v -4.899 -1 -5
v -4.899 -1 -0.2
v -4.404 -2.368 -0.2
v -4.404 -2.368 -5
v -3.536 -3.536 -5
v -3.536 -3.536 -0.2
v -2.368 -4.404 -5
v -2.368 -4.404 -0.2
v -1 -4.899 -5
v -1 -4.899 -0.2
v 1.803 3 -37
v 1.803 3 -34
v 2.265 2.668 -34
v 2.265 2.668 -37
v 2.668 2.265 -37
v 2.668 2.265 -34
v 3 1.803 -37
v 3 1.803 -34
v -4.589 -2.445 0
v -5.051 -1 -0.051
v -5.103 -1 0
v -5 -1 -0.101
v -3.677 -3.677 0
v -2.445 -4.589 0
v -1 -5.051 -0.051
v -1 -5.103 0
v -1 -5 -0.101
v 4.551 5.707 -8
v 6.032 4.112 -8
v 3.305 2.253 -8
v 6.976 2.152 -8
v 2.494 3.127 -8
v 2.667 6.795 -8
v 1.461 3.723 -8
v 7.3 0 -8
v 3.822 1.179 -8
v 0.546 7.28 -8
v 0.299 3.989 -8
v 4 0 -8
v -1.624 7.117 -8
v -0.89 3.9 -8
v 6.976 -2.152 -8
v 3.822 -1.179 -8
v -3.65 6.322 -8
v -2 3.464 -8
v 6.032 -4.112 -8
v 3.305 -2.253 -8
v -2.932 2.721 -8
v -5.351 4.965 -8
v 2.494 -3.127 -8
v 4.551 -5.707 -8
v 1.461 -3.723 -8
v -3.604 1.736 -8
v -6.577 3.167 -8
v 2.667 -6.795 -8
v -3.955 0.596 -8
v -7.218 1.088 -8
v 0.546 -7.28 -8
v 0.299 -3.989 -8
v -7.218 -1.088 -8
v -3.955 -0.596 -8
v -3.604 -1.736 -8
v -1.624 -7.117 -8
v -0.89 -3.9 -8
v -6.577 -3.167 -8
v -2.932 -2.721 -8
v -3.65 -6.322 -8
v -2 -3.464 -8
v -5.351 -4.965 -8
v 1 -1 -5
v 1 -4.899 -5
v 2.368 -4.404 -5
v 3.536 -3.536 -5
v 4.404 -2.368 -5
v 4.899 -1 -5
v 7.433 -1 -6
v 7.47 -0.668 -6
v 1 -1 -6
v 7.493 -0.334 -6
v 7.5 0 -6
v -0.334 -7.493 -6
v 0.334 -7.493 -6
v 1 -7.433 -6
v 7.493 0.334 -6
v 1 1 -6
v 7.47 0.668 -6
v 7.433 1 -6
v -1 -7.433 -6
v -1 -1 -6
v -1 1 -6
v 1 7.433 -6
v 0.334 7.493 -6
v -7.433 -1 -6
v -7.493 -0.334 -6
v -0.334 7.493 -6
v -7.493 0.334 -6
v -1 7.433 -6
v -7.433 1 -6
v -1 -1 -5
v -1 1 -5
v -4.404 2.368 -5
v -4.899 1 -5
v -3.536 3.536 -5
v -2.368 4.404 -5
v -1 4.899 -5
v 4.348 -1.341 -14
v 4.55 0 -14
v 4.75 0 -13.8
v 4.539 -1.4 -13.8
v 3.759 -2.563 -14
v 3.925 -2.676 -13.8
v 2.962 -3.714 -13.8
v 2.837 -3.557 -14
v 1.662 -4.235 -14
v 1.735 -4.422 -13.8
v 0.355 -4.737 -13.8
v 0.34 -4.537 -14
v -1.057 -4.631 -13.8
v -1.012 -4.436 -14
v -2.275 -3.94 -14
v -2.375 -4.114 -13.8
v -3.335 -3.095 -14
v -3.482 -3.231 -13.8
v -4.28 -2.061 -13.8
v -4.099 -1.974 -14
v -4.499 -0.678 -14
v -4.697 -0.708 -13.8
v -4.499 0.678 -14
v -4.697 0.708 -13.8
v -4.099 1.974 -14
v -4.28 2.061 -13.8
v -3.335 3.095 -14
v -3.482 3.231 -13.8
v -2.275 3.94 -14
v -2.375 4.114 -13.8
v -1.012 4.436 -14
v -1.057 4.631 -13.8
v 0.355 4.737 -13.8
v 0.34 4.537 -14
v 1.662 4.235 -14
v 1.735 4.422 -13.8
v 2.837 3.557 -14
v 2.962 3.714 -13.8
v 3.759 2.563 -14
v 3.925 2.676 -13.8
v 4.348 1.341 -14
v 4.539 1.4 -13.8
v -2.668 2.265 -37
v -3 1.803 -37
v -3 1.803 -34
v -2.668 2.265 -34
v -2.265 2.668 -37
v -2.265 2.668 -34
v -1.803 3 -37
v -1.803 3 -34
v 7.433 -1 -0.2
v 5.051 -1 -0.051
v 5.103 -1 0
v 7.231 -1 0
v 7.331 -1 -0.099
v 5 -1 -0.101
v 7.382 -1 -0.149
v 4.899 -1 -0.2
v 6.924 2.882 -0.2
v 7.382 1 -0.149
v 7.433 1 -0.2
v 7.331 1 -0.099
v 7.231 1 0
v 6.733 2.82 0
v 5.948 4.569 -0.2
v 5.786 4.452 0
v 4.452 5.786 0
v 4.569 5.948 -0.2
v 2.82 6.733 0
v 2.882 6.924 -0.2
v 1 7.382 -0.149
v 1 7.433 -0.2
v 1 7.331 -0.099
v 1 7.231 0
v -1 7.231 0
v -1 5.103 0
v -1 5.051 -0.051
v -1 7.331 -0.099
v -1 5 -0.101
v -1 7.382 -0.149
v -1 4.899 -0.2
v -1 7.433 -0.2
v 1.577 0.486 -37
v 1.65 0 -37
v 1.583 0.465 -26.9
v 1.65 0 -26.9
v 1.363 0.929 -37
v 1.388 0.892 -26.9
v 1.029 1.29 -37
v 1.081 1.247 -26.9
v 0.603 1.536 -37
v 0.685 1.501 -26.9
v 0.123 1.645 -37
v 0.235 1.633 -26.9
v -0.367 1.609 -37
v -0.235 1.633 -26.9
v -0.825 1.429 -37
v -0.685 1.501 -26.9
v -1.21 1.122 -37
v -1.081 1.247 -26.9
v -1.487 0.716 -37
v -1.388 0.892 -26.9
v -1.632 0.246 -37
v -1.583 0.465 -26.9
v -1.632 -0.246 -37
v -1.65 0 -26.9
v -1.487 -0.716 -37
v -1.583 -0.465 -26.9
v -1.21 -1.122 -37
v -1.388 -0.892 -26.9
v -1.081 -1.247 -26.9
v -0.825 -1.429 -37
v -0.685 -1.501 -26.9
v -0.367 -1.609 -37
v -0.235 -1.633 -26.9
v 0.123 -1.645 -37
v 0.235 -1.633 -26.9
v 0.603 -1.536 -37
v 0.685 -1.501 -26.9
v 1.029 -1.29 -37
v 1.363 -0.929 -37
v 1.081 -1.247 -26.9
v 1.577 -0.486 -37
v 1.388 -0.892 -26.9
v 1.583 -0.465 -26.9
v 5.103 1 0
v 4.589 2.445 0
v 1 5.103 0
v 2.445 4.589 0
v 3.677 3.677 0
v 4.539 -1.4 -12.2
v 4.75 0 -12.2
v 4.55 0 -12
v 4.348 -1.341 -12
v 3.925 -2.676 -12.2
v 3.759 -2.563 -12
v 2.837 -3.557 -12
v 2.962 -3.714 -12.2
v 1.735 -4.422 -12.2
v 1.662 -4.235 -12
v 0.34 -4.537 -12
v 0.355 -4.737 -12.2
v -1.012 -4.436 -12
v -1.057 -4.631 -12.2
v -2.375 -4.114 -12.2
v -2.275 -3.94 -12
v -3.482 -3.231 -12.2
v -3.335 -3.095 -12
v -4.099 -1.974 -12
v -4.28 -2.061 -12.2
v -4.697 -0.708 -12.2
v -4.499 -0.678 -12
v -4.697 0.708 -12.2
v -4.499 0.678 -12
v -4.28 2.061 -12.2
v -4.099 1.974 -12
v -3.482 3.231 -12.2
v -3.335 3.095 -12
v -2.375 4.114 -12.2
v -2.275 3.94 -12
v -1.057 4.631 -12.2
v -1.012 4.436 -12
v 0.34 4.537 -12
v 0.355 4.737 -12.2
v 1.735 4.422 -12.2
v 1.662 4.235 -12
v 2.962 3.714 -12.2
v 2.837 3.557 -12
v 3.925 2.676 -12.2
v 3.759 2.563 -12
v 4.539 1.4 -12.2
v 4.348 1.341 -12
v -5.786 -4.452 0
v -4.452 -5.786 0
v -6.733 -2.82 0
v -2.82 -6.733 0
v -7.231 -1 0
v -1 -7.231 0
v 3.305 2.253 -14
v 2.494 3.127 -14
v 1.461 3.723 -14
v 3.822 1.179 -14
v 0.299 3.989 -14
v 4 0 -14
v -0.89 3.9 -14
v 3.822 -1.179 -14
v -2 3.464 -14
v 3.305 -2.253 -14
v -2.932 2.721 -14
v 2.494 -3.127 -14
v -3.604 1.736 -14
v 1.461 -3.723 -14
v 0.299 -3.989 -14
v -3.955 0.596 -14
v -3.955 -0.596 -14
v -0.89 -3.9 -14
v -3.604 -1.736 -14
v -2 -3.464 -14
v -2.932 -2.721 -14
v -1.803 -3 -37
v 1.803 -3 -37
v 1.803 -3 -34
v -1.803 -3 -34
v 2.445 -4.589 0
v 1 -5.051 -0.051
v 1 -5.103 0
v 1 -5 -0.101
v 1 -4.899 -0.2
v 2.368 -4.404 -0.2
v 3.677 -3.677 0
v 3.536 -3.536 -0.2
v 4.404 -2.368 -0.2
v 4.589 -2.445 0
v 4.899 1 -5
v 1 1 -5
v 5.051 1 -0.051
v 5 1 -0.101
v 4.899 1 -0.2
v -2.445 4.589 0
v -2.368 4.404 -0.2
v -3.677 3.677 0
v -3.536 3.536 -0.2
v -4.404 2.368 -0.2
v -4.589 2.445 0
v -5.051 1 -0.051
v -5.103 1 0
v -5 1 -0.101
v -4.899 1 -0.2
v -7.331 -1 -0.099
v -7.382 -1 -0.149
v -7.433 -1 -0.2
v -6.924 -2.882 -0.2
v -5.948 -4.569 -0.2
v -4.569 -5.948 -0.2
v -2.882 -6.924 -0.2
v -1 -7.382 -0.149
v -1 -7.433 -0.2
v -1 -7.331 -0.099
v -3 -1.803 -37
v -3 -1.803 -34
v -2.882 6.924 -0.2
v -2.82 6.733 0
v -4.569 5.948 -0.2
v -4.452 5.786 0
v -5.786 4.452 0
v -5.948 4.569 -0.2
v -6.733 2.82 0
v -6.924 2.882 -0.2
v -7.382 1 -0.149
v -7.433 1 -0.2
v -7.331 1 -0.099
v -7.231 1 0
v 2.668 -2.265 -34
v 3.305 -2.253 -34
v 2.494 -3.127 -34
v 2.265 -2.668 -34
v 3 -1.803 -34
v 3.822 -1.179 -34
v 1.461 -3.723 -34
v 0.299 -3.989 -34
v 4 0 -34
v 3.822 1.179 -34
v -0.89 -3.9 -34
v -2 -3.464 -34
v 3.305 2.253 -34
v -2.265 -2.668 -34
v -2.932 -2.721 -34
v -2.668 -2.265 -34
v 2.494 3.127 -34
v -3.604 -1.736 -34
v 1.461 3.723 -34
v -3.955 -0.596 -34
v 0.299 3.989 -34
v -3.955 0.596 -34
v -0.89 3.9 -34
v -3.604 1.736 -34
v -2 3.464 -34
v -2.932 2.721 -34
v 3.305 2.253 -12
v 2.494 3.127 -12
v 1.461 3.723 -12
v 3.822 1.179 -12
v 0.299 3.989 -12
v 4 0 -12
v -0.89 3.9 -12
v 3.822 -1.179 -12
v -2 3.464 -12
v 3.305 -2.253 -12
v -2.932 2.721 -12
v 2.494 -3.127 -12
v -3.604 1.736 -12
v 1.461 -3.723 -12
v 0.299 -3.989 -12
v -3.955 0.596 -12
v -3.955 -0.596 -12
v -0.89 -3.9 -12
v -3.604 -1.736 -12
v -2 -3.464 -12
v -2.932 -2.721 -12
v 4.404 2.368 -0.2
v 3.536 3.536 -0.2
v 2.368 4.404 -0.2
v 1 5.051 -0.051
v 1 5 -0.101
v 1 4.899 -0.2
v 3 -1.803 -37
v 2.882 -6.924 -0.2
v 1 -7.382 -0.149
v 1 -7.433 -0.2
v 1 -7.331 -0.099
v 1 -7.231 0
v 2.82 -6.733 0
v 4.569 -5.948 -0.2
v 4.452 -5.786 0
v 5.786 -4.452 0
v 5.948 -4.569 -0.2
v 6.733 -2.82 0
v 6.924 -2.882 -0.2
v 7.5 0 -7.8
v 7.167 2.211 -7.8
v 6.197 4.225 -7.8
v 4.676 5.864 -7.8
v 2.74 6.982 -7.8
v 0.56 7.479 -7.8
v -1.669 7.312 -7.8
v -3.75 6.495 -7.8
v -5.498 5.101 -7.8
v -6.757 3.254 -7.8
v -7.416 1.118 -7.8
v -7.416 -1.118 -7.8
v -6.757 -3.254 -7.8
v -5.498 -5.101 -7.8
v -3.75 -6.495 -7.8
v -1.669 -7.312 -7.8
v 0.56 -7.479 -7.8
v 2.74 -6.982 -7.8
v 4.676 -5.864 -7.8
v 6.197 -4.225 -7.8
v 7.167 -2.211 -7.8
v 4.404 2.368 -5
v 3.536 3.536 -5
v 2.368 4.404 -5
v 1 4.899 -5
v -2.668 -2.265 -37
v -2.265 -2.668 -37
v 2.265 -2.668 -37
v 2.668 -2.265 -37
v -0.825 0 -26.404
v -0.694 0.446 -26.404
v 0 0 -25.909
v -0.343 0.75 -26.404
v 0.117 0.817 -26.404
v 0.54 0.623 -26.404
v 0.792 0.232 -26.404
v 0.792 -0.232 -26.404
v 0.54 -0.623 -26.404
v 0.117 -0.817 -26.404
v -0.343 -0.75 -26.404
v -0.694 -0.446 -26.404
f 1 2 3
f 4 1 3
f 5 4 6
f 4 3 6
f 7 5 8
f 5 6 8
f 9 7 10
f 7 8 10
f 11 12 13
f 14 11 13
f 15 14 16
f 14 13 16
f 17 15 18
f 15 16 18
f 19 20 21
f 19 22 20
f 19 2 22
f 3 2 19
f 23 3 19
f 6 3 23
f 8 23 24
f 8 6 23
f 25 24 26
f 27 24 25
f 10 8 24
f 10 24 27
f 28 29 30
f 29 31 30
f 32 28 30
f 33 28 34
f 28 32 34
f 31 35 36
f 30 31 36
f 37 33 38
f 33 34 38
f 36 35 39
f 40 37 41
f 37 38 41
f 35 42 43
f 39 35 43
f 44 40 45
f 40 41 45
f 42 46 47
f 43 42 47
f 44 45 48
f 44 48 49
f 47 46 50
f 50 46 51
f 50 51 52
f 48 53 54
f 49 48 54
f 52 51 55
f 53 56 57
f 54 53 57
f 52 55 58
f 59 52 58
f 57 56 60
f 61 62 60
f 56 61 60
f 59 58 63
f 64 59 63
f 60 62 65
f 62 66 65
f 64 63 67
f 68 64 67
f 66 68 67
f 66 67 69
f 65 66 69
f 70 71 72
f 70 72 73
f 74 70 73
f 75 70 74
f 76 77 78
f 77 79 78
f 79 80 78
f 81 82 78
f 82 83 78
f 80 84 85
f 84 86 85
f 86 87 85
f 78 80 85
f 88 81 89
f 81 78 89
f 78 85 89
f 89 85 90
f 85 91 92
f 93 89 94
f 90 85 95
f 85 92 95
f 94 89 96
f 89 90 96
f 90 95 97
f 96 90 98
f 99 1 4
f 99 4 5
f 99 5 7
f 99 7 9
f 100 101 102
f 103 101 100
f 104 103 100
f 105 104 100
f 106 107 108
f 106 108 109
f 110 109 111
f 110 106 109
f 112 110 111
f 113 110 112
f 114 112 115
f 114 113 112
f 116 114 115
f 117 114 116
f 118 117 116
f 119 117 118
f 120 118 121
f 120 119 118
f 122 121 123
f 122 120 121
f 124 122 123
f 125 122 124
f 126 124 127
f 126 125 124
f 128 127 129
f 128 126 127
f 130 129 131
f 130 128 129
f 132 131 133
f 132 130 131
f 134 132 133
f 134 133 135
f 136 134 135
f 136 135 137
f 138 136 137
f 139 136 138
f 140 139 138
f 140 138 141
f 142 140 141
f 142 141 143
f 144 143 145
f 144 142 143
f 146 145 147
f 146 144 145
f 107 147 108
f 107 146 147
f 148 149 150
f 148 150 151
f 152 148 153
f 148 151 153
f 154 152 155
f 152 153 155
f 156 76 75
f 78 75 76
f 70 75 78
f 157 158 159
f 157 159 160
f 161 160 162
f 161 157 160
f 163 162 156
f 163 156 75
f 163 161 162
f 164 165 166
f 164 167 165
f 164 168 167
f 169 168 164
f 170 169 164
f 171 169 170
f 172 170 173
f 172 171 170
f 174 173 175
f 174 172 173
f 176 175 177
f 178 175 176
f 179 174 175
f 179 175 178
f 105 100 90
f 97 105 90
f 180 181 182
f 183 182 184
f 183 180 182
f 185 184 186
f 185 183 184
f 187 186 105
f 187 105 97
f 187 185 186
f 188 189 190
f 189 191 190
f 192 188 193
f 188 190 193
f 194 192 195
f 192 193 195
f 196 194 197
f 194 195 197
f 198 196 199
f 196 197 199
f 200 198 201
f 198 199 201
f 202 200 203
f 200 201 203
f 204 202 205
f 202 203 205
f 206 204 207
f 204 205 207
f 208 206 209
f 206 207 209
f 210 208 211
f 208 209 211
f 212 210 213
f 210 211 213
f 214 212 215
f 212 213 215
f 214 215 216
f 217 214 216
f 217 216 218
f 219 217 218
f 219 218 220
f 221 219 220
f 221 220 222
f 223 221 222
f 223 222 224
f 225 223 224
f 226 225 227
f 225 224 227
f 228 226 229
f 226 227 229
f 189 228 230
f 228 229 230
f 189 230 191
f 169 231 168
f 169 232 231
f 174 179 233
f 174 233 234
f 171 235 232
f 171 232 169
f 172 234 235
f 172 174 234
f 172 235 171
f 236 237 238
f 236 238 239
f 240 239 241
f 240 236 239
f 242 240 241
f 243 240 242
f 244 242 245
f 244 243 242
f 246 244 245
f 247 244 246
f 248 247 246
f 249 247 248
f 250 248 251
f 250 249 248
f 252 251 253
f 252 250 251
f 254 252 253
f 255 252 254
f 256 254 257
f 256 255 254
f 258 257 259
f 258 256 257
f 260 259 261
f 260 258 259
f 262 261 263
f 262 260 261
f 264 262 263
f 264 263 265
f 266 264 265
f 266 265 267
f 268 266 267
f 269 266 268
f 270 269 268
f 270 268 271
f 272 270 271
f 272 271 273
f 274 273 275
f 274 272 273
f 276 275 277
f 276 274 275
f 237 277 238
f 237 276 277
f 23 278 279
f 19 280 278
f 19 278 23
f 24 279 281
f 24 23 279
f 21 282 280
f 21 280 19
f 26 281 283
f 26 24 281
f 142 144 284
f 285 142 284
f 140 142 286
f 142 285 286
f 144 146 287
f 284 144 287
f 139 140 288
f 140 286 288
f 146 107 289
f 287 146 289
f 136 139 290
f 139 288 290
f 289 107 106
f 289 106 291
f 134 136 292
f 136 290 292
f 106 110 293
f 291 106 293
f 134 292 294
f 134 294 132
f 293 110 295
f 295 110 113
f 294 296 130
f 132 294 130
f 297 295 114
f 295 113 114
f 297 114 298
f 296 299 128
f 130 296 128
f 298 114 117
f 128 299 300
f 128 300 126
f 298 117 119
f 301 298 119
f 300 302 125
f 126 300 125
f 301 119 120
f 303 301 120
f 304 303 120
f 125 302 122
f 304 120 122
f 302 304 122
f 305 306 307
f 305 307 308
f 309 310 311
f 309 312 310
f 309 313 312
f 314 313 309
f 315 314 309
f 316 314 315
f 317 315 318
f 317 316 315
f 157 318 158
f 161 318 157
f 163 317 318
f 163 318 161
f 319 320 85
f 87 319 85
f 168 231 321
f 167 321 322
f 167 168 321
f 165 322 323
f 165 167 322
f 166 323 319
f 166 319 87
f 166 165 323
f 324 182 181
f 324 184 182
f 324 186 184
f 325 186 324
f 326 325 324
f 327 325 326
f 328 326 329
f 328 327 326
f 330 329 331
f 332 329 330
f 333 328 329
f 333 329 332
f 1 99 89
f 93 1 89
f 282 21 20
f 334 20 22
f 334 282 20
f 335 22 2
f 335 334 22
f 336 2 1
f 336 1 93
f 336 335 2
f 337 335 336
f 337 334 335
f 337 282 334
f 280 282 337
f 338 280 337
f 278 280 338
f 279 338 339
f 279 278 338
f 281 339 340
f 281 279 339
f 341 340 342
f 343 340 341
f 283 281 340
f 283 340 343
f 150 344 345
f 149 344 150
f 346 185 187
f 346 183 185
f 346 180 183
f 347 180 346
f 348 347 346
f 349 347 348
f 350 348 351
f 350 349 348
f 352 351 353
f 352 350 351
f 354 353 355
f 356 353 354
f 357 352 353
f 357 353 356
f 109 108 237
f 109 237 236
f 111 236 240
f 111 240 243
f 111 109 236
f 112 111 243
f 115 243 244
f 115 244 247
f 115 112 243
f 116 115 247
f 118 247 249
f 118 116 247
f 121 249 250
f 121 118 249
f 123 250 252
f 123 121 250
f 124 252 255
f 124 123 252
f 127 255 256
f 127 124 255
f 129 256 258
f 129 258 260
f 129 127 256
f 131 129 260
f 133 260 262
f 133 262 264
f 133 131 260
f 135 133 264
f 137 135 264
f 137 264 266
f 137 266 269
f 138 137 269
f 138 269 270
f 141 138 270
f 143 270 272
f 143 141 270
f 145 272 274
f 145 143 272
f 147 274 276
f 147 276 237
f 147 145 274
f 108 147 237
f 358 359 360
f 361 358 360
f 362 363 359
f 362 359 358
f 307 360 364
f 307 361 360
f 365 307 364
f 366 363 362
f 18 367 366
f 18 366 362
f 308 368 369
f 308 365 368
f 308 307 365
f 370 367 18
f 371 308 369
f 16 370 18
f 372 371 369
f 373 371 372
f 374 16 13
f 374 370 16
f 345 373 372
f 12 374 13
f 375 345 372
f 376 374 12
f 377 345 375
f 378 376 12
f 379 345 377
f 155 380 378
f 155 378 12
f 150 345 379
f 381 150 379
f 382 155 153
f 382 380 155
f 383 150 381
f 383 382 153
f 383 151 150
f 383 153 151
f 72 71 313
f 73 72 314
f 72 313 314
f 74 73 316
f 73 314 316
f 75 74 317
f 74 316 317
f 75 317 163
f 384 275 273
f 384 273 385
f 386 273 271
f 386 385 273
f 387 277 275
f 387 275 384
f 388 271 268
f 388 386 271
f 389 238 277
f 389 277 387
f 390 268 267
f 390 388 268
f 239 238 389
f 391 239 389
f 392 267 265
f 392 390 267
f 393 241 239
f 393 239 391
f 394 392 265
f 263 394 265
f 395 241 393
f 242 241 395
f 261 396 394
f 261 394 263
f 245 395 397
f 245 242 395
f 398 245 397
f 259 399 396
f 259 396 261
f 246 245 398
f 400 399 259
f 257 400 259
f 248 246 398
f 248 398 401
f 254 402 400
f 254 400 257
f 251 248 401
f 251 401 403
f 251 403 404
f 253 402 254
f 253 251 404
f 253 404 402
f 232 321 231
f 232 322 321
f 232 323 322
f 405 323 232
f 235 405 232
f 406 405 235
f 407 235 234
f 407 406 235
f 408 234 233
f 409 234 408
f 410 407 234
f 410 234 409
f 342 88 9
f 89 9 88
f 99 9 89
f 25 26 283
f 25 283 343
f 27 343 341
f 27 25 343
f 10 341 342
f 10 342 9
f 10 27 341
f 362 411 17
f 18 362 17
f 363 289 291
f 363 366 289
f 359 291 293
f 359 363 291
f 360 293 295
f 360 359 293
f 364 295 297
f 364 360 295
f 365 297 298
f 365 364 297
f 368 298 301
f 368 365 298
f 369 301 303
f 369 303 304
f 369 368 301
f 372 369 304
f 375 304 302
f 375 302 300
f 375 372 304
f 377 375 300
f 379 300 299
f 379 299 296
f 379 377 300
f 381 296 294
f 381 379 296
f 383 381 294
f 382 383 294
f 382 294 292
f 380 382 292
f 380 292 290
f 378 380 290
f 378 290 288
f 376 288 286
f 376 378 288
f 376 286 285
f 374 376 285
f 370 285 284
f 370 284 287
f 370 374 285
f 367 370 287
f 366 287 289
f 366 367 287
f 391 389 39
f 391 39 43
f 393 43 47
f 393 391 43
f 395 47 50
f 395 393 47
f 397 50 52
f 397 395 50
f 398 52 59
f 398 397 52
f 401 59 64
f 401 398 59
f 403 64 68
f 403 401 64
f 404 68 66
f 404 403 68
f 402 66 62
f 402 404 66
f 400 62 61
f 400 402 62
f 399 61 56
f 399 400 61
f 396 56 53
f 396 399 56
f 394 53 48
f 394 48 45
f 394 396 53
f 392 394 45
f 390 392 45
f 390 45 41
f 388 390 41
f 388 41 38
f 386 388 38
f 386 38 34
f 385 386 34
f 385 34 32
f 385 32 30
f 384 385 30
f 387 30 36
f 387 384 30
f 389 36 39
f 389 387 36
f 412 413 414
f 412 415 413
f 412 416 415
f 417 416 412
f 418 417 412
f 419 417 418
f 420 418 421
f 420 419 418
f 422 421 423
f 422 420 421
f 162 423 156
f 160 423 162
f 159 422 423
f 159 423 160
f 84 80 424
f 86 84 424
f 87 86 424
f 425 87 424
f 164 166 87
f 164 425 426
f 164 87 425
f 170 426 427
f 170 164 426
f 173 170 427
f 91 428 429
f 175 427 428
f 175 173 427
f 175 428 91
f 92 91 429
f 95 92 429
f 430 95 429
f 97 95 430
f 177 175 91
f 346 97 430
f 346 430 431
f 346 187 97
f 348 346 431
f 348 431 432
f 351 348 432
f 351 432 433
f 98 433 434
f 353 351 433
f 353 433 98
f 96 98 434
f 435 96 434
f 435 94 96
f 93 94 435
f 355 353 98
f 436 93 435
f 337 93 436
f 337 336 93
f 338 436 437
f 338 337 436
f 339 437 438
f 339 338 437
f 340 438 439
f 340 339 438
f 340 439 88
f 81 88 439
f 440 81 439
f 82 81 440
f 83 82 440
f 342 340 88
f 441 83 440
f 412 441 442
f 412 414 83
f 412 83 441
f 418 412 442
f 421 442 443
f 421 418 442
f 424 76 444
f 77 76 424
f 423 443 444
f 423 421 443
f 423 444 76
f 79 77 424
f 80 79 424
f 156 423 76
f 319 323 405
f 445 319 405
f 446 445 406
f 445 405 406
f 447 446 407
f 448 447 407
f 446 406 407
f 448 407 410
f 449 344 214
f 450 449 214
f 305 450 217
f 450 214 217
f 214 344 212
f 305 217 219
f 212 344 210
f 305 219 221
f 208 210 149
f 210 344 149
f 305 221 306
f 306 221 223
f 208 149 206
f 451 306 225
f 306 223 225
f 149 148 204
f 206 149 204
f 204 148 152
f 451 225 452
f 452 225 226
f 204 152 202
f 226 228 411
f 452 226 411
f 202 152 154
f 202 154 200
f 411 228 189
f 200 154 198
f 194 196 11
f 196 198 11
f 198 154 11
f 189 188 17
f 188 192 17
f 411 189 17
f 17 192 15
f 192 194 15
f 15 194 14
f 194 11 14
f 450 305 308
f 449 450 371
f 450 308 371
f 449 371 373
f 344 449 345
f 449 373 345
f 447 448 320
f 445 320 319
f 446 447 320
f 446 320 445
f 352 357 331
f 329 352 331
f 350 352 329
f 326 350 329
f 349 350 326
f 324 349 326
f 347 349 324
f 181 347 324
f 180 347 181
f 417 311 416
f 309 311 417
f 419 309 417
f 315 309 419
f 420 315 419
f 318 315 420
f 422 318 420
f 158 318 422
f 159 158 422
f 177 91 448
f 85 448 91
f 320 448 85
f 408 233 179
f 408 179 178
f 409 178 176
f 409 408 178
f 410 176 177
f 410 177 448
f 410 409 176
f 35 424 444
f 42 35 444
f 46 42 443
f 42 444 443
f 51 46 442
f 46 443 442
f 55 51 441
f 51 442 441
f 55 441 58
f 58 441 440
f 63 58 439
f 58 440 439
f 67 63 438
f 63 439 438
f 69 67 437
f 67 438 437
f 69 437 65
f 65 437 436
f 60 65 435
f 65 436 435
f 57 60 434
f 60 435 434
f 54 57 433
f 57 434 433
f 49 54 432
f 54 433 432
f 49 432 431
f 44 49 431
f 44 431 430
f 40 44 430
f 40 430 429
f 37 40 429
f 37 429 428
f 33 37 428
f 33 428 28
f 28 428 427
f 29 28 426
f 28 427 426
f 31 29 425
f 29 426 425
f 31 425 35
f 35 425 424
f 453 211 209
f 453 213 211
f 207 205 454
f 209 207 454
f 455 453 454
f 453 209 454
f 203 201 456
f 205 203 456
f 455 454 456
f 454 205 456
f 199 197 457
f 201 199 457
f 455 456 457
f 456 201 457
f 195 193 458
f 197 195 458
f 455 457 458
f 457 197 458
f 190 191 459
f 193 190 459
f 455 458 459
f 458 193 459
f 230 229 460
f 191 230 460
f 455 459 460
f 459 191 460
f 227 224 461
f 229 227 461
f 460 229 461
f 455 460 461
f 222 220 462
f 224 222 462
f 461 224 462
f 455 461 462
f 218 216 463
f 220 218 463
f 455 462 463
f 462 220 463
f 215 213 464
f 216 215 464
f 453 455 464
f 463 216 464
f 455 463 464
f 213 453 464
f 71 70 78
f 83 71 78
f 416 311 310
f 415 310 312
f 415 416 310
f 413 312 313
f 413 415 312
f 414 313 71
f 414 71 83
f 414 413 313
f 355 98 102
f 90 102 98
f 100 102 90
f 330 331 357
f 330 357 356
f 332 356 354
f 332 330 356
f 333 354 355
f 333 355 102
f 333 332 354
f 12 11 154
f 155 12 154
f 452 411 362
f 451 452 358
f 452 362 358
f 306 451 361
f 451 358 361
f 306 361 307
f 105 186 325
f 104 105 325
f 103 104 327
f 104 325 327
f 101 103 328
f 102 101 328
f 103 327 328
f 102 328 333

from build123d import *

# Parameters (mm, degrees)
SKETCH1_R                 = 7.5
BOSS_EXTRUDE1_DEPTH       = 37
SKETCH2_W                 = 3.5
SKETCH2_H                 = 29
CUT_EXTRUDE1_DEPTH        = 6
CUT_EXTRUDE2_DEPTH        = 6
SKETCH6_R                 = 5
CUT_EXTRUDE3_DEPTH        = 5
SKETCH10_OUTSIDE_W        = 25.53
SKETCH10_OUTSIDE_H        = 25.53
SKETCH10_OUTSIDE_W_2      = 6
SKETCH10_OUTSIDE_H_2      = 6
CUT_EXTRUDE4_DEPTH        = 3
SKETCH19_R                = 4.909942114
SKETCH19_R_2              = 3.5
CUT_EXTRUDE5_DEPTH        = 4
M4X0_7_TAPPED_HOLE1_D     = 3.3
M4X0_7_TAPPED_HOLE1_DEPTH = 10.1
M4X0_7_TAPPED_HOLE1_TIP   = 0.991420021
SKETCH17_W                = 0.75
SKETCH17_H                = 2
CHAMFER1_SIZE             = 0.2
CHAMFER2_SIZE             = 0.2


with BuildPart() as part:
    # Sketch1 → Boss-Extrude1 (new body)
    with BuildSketch(Plane.XY):
        Circle(SKETCH1_R)
    extrude(amount=-BOSS_EXTRUDE1_DEPTH)

    # Sketch2 → Cut-Revolve1 (revolve, cut)
    with BuildSketch(Plane(origin=(0, 0, 0), x_dir=(1, 0, 0), z_dir=(0, 1, 0))):
        with Locations((5.75, 22.5)):
            Rectangle(SKETCH2_W, SKETCH2_H)
    revolve(axis=Axis((0, 0, 0), (0, 0, -1)), mode=Mode.SUBTRACT)

    # Sketch4 → Cut-Extrude1 (cut)
    with BuildSketch(Plane.XY):
        with BuildLine():
            Line((-9.646529656, 1), (9.646529656, 1))
            ThreePointArc((9.646529656, 1), (10.646529656, 0), (9.646529656, -1))
            Line((9.646529656, -1), (-9.646529656, -1))
            ThreePointArc((-9.646529656, -1), (-10.646529656, 0), (-9.646529656, 1))
        make_face()
    extrude(amount=-CUT_EXTRUDE1_DEPTH, mode=Mode.SUBTRACT)

    # Sketch5 → Cut-Extrude2 (cut)
    with BuildSketch(Plane.XY):
        with BuildLine():
            Line((1, 8.5), (1, -8.5))
            ThreePointArc((1, -8.5), (0, -9.5), (-1, -8.5))
            Line((-1, -8.5), (-1, 8.5))
            ThreePointArc((-1, 8.5), (0, 9.5), (1, 8.5))
        make_face()
    extrude(amount=-CUT_EXTRUDE2_DEPTH, mode=Mode.SUBTRACT)

    # Sketch6 → Cut-Extrude3 (cut)
    with BuildSketch(Plane.XY):
        Circle(SKETCH6_R)
    extrude(amount=-CUT_EXTRUDE3_DEPTH, mode=Mode.SUBTRACT)

    # Sketch10 outside → Cut-Extrude4 (cut)
    with BuildSketch(Plane(origin=(0, 0, -37), x_dir=(-1, 0, 0), z_dir=(0, 0, -1))):
        Rectangle(SKETCH10_OUTSIDE_W, SKETCH10_OUTSIDE_H)
        Rectangle(SKETCH10_OUTSIDE_W_2, SKETCH10_OUTSIDE_H_2, mode=Mode.SUBTRACT)
    extrude(amount=-CUT_EXTRUDE4_DEPTH, mode=Mode.SUBTRACT)

    # Sketch19 → Cut-Extrude5 (cut, through all)
    with BuildSketch(Plane(origin=(0, 0, -34), x_dir=(-1, 0, 0), z_dir=(0, 0, -1))):
        Circle(SKETCH19_R)
        Circle(SKETCH19_R_2, mode=Mode.SUBTRACT)
    extrude(amount=CUT_EXTRUDE5_DEPTH, mode=Mode.SUBTRACT)

    # M4x0.7 Tapped Hole1
    with Locations(Plane(origin=(0, 0, -37), x_dir=(-1, 0, 0), z_dir=(0, 0, -1))):
        with Locations((0, 0)):
            Hole(M4X0_7_TAPPED_HOLE1_D / 2, depth=M4X0_7_TAPPED_HOLE1_DEPTH)
            with Locations((0, 0, -(M4X0_7_TAPPED_HOLE1_DEPTH + M4X0_7_TAPPED_HOLE1_TIP / 2))):  # 118° drill point
                Cone(0, M4X0_7_TAPPED_HOLE1_D / 2, M4X0_7_TAPPED_HOLE1_TIP, mode=Mode.SUBTRACT)

    # Sketch17 → Revolve1 (revolve)
    with BuildSketch(Plane(origin=(0, 0, 0), x_dir=(1, 0, 0), z_dir=(0, 1, 0))):
        with Locations((4.375, 13)):
            Rectangle(SKETCH17_W, SKETCH17_H)
    revolve(axis=Axis((0, 0, 0), (0, 0, -1)))

    # Chamfer1
    chamfer1_edges = [part.edges().sort_by_distance(p)[0] for p in [
        (-4.75, 0, -12),
        (-4.75, 0, -14),
    ]]
    chamfer(chamfer1_edges, length=CHAMFER1_SIZE)

    # Chamfer2
    chamfer2_edges = [part.edges().sort_by_distance(p)[0] for p in [
        (-5.303300859, -5.303300859, 0),
        (5.303300859, 5.303300859, 0),
        (5.303300859, -5.303300859, 0),
        (-5.303300859, 5.303300859, 0),
        (-7.5, 0, -8),
        (-3.535533906, -3.535533906, 0),
        (3.535533906, -3.535533906, 0),
        (3.535533906, 3.535533906, 0),
        (-3.535533906, 3.535533906, 0),
    ]]
    chamfer(chamfer2_edges, length=CHAMFER2_SIZE)


solid = part.part
